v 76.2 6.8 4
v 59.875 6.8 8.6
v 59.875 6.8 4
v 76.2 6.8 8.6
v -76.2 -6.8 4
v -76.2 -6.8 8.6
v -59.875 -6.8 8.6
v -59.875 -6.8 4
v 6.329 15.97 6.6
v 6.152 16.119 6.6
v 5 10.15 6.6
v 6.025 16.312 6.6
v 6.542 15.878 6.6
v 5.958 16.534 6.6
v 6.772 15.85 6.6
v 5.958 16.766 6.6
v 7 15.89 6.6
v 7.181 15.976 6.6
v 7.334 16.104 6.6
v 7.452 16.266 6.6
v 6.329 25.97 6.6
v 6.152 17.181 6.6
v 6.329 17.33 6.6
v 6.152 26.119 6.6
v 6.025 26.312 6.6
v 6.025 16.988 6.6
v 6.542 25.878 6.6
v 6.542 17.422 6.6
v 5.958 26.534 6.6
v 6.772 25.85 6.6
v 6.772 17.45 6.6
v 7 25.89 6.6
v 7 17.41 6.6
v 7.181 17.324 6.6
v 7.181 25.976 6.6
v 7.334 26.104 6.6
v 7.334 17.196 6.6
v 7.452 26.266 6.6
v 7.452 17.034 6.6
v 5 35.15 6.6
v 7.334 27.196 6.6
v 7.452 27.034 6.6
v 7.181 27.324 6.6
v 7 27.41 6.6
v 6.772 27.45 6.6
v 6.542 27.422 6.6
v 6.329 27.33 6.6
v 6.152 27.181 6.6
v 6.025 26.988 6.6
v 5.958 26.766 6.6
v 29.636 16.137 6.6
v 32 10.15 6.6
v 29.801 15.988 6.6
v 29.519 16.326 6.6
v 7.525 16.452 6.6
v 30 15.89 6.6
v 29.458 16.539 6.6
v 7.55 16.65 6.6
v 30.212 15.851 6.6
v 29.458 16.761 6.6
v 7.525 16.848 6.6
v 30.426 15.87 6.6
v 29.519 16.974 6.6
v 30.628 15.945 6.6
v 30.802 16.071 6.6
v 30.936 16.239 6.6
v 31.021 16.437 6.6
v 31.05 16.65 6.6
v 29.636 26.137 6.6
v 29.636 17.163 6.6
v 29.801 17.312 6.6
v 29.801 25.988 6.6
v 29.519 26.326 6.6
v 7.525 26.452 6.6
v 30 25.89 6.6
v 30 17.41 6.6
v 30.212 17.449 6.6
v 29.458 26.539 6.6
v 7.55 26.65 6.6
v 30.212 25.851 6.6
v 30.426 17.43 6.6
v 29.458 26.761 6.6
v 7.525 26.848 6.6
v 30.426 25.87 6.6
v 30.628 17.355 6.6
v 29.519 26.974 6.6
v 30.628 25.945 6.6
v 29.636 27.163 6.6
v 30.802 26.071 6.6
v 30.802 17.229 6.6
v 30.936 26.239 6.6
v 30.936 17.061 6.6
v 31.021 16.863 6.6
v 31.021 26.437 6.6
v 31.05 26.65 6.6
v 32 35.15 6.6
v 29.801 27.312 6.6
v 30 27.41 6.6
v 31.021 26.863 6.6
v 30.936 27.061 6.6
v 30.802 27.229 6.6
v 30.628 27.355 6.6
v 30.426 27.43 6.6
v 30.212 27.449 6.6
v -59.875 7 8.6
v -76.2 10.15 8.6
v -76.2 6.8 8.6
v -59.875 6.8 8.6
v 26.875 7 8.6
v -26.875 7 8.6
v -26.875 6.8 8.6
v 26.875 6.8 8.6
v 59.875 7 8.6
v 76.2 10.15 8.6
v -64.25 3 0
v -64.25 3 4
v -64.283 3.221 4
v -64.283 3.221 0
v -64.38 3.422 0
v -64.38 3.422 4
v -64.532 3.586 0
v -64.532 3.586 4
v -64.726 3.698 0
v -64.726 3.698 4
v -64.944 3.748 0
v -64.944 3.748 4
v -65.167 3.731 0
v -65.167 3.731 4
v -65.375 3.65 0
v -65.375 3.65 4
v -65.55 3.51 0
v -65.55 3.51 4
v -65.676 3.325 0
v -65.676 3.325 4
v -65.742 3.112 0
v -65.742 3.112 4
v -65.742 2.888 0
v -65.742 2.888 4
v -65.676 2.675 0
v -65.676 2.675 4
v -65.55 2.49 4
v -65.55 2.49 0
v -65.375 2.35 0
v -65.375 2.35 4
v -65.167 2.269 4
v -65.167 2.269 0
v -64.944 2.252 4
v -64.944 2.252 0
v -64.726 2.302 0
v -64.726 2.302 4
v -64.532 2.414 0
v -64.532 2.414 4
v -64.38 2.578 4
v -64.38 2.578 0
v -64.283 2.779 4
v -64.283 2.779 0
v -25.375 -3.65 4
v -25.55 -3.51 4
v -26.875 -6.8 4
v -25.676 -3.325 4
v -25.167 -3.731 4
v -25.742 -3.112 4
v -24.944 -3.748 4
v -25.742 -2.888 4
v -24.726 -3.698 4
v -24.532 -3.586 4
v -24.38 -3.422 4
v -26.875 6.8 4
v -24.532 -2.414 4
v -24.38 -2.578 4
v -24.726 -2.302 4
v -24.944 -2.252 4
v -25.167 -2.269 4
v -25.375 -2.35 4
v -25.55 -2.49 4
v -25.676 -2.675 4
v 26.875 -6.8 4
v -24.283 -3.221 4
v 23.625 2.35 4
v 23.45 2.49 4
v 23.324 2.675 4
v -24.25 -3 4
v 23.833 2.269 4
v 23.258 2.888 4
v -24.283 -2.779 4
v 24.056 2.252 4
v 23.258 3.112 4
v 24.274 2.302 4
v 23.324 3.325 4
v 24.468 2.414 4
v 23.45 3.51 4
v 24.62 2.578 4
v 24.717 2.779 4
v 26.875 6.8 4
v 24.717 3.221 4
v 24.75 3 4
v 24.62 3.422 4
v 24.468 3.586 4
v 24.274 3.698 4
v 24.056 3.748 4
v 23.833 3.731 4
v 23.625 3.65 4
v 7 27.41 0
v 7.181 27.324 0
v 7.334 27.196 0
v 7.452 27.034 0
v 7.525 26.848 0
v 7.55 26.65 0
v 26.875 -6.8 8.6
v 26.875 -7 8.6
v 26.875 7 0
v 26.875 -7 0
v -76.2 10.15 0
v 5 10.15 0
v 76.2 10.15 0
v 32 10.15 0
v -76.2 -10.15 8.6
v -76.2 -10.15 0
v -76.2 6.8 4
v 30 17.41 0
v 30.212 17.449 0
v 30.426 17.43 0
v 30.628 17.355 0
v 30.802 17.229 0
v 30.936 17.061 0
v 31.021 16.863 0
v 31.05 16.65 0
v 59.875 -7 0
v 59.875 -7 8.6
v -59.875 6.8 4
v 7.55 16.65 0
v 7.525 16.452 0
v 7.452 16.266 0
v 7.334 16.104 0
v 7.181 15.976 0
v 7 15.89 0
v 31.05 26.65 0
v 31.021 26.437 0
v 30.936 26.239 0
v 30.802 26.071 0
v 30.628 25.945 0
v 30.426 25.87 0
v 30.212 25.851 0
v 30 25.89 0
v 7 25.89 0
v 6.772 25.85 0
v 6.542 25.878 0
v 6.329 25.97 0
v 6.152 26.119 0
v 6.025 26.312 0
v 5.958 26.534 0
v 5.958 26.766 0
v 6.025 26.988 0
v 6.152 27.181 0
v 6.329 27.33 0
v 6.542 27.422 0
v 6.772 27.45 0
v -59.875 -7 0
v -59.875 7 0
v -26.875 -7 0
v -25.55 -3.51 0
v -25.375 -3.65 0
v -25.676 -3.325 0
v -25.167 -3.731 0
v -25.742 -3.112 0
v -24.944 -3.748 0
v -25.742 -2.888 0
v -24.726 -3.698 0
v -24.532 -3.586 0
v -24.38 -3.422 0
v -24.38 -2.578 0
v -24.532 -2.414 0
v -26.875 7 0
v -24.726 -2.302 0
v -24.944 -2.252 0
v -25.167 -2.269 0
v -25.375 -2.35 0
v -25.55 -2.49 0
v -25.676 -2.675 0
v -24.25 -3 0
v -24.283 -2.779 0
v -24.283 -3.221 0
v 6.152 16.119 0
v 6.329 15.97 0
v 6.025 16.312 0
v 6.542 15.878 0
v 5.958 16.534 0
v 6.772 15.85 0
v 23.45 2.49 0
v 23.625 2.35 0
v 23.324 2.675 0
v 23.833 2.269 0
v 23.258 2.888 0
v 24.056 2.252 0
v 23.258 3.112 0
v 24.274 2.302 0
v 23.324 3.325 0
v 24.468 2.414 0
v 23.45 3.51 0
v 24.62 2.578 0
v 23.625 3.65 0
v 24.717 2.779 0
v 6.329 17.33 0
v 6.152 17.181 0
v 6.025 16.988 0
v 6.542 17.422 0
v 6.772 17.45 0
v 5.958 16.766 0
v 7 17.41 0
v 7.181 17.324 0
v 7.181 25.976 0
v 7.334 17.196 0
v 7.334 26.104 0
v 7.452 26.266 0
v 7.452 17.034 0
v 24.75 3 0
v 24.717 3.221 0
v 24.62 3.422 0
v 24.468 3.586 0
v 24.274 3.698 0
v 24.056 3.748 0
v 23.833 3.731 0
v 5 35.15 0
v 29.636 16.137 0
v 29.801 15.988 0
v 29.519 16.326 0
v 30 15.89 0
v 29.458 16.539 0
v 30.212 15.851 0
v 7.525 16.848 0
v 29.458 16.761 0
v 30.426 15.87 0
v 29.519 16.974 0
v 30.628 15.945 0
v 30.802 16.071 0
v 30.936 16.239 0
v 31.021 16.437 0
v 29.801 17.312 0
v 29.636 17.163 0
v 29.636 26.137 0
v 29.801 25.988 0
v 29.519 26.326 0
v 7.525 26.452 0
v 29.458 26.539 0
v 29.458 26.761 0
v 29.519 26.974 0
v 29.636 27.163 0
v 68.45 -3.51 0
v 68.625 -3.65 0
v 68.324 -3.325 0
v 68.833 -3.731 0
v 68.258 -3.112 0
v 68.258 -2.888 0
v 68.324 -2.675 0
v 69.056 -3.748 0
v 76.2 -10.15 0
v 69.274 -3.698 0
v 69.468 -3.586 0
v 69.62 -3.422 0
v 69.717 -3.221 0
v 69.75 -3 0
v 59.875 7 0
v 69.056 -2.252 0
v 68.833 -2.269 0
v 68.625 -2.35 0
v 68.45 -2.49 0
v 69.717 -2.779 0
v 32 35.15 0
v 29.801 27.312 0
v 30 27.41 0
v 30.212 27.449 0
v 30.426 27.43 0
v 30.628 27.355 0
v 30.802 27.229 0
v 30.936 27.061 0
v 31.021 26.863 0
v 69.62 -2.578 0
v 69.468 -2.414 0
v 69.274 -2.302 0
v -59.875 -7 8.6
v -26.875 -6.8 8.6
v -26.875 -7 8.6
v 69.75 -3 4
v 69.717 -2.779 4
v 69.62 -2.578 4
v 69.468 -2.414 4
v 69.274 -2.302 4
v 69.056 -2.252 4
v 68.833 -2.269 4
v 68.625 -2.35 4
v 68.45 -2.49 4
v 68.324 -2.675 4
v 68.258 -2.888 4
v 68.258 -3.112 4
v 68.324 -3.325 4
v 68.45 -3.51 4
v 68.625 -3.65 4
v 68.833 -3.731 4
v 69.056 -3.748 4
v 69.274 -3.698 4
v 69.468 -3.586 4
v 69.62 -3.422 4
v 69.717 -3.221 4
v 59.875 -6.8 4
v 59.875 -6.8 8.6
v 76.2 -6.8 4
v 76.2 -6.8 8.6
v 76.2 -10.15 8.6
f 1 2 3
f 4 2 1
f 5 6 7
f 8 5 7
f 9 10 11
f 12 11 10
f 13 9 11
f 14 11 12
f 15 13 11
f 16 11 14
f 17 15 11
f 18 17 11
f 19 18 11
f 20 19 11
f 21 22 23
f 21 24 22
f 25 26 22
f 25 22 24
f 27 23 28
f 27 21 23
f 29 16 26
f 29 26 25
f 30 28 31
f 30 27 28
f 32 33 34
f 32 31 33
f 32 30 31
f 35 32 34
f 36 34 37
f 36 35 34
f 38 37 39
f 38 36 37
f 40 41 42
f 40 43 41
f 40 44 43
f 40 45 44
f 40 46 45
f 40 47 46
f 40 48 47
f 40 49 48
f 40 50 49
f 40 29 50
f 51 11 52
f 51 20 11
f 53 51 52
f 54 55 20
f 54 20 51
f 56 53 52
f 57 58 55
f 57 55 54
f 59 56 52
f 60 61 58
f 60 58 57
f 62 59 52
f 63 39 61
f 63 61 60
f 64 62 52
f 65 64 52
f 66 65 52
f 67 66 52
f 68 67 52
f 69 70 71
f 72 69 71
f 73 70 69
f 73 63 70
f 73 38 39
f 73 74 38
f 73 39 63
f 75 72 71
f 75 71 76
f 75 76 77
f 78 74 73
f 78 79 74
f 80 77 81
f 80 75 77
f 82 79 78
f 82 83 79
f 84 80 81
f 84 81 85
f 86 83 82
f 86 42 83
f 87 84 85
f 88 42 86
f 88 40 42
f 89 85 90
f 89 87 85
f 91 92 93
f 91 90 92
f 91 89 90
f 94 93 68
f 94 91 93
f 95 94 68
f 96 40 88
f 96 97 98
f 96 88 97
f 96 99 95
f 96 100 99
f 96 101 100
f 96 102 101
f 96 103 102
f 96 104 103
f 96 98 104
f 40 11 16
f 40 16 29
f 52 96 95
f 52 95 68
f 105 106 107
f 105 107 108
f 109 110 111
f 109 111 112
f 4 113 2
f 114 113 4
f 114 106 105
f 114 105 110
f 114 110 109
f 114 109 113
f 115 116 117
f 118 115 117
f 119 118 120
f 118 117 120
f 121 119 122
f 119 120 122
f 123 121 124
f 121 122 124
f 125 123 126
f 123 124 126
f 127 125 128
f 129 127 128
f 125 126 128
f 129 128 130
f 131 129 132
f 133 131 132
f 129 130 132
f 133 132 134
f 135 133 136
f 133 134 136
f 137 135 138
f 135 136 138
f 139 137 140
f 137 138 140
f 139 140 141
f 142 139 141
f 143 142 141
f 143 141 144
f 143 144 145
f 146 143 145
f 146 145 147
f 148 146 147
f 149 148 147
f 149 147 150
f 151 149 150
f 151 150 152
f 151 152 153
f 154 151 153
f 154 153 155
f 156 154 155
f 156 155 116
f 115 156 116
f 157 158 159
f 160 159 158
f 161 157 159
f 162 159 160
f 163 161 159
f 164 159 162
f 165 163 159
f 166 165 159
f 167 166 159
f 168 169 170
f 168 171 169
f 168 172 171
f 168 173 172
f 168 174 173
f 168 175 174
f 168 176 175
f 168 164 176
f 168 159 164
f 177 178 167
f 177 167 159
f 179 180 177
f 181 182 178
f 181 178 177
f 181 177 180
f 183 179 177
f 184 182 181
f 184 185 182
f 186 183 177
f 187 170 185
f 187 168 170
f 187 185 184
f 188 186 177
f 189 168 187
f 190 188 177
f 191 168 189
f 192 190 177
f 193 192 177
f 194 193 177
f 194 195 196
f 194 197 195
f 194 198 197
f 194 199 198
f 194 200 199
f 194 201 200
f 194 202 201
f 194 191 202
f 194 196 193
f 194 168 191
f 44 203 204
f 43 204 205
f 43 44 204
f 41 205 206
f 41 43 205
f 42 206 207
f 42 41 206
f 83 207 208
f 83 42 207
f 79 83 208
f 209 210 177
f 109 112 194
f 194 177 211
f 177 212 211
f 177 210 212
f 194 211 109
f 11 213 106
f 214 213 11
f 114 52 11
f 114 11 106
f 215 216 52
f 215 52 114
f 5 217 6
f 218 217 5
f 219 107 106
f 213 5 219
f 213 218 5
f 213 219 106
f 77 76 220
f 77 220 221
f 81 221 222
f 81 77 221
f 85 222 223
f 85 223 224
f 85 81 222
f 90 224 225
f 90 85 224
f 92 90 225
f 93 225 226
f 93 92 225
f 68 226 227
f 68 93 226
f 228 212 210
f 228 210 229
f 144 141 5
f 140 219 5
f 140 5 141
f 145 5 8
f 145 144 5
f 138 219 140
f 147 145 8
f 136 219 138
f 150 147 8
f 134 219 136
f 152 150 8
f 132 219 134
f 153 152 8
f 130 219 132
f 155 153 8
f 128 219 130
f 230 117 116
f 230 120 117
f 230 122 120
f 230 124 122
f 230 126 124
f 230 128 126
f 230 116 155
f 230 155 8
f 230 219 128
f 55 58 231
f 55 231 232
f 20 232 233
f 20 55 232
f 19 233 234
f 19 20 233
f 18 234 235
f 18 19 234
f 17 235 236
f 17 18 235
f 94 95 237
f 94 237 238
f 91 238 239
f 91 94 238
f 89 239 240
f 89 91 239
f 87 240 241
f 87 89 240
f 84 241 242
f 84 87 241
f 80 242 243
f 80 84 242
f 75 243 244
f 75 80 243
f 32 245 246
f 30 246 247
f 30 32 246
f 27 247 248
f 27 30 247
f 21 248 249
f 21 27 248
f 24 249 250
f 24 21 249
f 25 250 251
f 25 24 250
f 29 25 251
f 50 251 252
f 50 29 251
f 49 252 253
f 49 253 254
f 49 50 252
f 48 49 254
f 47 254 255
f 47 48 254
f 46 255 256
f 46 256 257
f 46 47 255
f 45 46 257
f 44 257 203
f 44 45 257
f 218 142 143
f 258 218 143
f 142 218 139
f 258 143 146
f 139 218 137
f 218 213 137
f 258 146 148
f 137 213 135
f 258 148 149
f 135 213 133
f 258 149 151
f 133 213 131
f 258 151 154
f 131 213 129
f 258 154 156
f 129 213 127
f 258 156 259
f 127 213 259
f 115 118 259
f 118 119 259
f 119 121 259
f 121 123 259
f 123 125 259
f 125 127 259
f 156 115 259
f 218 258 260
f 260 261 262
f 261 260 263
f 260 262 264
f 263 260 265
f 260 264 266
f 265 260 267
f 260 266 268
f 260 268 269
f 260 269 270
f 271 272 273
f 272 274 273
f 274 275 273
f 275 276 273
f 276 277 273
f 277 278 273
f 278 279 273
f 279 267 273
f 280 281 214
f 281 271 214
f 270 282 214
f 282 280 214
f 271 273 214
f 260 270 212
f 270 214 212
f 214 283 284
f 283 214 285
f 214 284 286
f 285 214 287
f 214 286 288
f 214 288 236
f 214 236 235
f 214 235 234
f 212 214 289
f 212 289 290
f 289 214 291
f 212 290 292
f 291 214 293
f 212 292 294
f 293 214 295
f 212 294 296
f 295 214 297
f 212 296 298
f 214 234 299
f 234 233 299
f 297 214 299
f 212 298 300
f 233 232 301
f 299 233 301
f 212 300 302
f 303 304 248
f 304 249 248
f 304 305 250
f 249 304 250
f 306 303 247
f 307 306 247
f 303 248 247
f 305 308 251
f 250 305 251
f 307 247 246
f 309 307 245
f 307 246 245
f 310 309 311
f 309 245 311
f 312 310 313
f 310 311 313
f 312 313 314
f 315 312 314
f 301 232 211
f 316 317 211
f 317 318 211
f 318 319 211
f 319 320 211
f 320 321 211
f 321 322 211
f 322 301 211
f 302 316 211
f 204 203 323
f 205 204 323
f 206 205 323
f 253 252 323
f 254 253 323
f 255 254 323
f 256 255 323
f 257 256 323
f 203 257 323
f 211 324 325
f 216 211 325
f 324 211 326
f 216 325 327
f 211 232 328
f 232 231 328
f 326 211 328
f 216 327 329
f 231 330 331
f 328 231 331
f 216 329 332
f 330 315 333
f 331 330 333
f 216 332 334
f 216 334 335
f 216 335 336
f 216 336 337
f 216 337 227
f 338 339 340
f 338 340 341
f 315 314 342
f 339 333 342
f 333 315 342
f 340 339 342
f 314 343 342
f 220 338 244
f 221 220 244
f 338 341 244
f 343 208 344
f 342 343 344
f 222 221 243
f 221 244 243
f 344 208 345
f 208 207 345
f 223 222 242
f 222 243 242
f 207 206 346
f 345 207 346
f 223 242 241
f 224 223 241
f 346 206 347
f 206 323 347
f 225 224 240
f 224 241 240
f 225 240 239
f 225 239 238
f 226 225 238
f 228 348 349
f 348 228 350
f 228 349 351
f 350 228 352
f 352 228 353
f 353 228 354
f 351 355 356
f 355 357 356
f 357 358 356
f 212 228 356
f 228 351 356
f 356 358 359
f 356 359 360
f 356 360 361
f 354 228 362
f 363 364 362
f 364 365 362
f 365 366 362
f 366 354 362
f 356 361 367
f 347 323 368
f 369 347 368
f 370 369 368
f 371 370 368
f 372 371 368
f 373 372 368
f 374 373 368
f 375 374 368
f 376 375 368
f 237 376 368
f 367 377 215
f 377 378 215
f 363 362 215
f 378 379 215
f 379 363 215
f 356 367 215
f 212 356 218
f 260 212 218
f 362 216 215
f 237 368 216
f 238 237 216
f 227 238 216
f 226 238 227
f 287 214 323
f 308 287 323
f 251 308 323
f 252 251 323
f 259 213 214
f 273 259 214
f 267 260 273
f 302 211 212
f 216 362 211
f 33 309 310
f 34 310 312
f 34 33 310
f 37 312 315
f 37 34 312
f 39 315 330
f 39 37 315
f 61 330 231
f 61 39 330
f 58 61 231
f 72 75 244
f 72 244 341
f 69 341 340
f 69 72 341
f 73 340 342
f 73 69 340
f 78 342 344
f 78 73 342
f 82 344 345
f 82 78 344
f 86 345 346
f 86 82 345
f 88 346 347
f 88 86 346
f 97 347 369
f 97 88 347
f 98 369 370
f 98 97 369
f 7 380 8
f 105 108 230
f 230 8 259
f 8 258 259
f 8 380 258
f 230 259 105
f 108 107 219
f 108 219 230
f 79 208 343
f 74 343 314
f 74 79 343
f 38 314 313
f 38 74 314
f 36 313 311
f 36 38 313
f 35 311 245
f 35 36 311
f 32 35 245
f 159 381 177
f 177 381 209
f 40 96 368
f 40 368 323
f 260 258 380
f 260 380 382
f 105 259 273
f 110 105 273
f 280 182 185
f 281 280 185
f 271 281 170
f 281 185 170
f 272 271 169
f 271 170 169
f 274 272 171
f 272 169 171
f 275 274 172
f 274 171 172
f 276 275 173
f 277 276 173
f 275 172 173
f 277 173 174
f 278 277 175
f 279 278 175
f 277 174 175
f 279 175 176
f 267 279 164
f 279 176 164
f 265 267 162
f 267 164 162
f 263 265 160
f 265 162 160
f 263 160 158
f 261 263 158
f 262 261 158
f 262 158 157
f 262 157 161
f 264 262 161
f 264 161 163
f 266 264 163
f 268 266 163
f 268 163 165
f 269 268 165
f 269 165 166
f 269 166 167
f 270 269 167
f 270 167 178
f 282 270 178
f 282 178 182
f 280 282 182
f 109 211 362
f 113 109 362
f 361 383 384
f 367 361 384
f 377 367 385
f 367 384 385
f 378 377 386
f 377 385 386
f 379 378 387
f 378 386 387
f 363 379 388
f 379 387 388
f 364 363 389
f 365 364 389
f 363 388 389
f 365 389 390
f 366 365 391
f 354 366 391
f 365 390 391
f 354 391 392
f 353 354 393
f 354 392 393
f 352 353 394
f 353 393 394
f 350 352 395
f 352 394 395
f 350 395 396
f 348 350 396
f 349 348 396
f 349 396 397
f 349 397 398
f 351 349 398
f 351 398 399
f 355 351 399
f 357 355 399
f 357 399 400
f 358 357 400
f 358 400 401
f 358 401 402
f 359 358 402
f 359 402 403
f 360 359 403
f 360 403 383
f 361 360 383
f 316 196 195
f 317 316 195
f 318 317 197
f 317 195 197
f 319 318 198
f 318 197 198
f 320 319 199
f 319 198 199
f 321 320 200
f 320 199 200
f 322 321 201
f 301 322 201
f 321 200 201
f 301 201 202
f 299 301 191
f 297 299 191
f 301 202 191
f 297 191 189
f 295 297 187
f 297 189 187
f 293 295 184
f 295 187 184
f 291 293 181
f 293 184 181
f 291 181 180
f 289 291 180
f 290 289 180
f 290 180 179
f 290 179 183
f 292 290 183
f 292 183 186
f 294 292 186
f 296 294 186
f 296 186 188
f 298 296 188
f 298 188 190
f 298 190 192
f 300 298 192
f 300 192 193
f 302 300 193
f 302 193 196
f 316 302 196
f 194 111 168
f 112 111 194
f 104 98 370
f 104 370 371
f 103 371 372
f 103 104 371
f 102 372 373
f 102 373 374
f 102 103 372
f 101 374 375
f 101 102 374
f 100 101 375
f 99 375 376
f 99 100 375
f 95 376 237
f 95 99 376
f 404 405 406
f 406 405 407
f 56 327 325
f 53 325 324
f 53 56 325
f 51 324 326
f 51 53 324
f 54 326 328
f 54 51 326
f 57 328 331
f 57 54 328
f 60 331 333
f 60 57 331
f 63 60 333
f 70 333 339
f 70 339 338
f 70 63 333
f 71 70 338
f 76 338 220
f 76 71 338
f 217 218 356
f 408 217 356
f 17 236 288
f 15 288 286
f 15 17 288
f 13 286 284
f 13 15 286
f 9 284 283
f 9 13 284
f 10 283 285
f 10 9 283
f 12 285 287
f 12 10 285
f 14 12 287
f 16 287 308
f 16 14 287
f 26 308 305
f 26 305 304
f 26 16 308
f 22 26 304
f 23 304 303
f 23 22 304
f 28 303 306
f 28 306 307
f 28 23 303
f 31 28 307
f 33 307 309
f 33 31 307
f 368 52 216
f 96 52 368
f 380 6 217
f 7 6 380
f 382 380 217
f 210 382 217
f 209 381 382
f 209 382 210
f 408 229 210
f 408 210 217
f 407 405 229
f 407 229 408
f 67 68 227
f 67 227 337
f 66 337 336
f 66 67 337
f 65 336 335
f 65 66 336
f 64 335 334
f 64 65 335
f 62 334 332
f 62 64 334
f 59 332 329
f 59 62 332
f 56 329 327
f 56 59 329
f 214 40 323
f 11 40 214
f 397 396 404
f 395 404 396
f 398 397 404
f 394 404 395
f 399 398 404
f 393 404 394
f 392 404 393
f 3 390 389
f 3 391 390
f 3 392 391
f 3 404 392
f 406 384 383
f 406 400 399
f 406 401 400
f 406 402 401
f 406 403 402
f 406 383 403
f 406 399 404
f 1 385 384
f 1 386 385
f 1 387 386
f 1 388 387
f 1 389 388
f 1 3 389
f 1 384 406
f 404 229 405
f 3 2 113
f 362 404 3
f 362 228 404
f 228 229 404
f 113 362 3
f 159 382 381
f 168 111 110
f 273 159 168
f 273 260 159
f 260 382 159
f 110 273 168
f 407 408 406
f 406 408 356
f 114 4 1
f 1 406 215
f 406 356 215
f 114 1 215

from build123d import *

# Parameters (mm, degrees)
F0_W     = 152.4
F0_H     = 20.3
F0_W_2   = 33
F0_H_2   = 14
F1_DEPTH = 8.6
F2_W     = 152.4
F2_H     = 13.6
F3_DEPTH = 4.6
F6_DEPTH = 8.6
F7_W     = 27
F7_H     = 25
F8_DEPTH = 2
F4_R     = 0.75
F9_DEPTH = 4.001


with BuildPart() as f1:
    # F0 (on Top) → F1 (new body)
    with BuildSketch(Plane.XY):
        Rectangle(F0_W, F0_H)
        with Locations((-43.375, 0)):
            Rectangle(F0_W_2, F0_H_2, mode=Mode.SUBTRACT)
        with Locations((43.375, 0)):
            Rectangle(F0_W_2, F0_H_2, mode=Mode.SUBTRACT)
    extrude(amount=F1_DEPTH)

    # F2 (on face) → F3 (cut)
    with BuildSketch(Plane.XY.offset(8.6)):
        Rectangle(F2_W, F2_H)
    extrude(amount=-F3_DEPTH, mode=Mode.SUBTRACT)

    # F5 (on face) → F6 (join, through all)
    with BuildSketch(Plane.XY.offset(8.6)):
        with BuildLine():
            Line((7, 15.8900657923), (7, 10.15))
            Line((7, 10.15), (30, 10.15))
            Line((30, 10.15), (30, 15.8900657923))
            ThreePointArc((30, 15.8900657923), (29.45, 16.65), (30, 17.4099342077))
            Line((30, 17.4099342077), (30, 25.8900657923))
            ThreePointArc((30, 25.8900657923), (29.45, 26.65), (30, 27.4099342077))
            Line((30, 27.4099342077), (30, 33.15))
            Line((30, 33.15), (7, 33.15))
            Line((7, 33.15), (7, 27.4099342077))
            ThreePointArc((7, 27.4099342077), (7.3980740698, 27.119041576), (7.55, 26.65))
            ThreePointArc((7.55, 26.65), (7.3980740698, 26.180958424), (7, 25.8900657923))
            Line((7, 25.8900657923), (7, 17.4099342077))
            ThreePointArc((7, 17.4099342077), (7.3980740698, 17.119041576), (7.55, 16.65))
            ThreePointArc((7.55, 16.65), (7.3980740698, 16.180958424), (7, 15.8900657923))
        make_face()
        with BuildLine():
            Line((5, 10.15), (7, 10.15))
            Line((7, 10.15), (7, 15.8900657923))
            ThreePointArc((7, 15.8900657923), (5.95, 16.65), (7, 17.4099342077))
            Line((7, 17.4099342077), (7, 25.8900657923))
            ThreePointArc((7, 25.8900657923), (5.95, 26.65), (7, 27.4099342077))
            Line((7, 27.4099342077), (7, 33.15))
            Line((7, 33.15), (30, 33.15))
            Line((30, 33.15), (30, 27.4099342077))
            ThreePointArc((30, 27.4099342077), (30.719041576, 27.2980740698), (31.05, 26.65))
            ThreePointArc((31.05, 26.65), (30.719041576, 26.0019259302), (30, 25.8900657923))
            Line((30, 25.8900657923), (30, 17.4099342077))
            ThreePointArc((30, 17.4099342077), (30.719041576, 17.2980740698), (31.05, 16.65))
            ThreePointArc((31.05, 16.65), (30.719041576, 16.0019259302), (30, 15.8900657923))
            Line((30, 15.8900657923), (30, 10.15))
            Line((30, 10.15), (32, 10.15))
            Line((32, 10.15), (32, 35.15))
            Line((32, 35.15), (5, 35.15))
            Line((5, 35.15), (5, 10.15))
        make_face()
    extrude(amount=-F6_DEPTH)

    # F7 (on face) → F8 (cut)
    with BuildSketch(Plane.XY.offset(8.6)):
        with Locations((18.5, 22.65)):
            Rectangle(F7_W, F7_H)
    extrude(amount=-F8_DEPTH, mode=Mode.SUBTRACT)

    # F4 (on face) → F9 (cut, through all)
    with BuildSketch(Plane.XY.offset(4)):
        with Locations((24, 3)):
            Circle(F4_R)
        with Locations((-25, -3)):
            Circle(F4_R)
        with Locations((-65, 3)):
            Circle(F4_R)
        with Locations((69, -3)):
            Circle(F4_R)
    extrude(amount=-F9_DEPTH, mode=Mode.SUBTRACT)


solid = f1.part
